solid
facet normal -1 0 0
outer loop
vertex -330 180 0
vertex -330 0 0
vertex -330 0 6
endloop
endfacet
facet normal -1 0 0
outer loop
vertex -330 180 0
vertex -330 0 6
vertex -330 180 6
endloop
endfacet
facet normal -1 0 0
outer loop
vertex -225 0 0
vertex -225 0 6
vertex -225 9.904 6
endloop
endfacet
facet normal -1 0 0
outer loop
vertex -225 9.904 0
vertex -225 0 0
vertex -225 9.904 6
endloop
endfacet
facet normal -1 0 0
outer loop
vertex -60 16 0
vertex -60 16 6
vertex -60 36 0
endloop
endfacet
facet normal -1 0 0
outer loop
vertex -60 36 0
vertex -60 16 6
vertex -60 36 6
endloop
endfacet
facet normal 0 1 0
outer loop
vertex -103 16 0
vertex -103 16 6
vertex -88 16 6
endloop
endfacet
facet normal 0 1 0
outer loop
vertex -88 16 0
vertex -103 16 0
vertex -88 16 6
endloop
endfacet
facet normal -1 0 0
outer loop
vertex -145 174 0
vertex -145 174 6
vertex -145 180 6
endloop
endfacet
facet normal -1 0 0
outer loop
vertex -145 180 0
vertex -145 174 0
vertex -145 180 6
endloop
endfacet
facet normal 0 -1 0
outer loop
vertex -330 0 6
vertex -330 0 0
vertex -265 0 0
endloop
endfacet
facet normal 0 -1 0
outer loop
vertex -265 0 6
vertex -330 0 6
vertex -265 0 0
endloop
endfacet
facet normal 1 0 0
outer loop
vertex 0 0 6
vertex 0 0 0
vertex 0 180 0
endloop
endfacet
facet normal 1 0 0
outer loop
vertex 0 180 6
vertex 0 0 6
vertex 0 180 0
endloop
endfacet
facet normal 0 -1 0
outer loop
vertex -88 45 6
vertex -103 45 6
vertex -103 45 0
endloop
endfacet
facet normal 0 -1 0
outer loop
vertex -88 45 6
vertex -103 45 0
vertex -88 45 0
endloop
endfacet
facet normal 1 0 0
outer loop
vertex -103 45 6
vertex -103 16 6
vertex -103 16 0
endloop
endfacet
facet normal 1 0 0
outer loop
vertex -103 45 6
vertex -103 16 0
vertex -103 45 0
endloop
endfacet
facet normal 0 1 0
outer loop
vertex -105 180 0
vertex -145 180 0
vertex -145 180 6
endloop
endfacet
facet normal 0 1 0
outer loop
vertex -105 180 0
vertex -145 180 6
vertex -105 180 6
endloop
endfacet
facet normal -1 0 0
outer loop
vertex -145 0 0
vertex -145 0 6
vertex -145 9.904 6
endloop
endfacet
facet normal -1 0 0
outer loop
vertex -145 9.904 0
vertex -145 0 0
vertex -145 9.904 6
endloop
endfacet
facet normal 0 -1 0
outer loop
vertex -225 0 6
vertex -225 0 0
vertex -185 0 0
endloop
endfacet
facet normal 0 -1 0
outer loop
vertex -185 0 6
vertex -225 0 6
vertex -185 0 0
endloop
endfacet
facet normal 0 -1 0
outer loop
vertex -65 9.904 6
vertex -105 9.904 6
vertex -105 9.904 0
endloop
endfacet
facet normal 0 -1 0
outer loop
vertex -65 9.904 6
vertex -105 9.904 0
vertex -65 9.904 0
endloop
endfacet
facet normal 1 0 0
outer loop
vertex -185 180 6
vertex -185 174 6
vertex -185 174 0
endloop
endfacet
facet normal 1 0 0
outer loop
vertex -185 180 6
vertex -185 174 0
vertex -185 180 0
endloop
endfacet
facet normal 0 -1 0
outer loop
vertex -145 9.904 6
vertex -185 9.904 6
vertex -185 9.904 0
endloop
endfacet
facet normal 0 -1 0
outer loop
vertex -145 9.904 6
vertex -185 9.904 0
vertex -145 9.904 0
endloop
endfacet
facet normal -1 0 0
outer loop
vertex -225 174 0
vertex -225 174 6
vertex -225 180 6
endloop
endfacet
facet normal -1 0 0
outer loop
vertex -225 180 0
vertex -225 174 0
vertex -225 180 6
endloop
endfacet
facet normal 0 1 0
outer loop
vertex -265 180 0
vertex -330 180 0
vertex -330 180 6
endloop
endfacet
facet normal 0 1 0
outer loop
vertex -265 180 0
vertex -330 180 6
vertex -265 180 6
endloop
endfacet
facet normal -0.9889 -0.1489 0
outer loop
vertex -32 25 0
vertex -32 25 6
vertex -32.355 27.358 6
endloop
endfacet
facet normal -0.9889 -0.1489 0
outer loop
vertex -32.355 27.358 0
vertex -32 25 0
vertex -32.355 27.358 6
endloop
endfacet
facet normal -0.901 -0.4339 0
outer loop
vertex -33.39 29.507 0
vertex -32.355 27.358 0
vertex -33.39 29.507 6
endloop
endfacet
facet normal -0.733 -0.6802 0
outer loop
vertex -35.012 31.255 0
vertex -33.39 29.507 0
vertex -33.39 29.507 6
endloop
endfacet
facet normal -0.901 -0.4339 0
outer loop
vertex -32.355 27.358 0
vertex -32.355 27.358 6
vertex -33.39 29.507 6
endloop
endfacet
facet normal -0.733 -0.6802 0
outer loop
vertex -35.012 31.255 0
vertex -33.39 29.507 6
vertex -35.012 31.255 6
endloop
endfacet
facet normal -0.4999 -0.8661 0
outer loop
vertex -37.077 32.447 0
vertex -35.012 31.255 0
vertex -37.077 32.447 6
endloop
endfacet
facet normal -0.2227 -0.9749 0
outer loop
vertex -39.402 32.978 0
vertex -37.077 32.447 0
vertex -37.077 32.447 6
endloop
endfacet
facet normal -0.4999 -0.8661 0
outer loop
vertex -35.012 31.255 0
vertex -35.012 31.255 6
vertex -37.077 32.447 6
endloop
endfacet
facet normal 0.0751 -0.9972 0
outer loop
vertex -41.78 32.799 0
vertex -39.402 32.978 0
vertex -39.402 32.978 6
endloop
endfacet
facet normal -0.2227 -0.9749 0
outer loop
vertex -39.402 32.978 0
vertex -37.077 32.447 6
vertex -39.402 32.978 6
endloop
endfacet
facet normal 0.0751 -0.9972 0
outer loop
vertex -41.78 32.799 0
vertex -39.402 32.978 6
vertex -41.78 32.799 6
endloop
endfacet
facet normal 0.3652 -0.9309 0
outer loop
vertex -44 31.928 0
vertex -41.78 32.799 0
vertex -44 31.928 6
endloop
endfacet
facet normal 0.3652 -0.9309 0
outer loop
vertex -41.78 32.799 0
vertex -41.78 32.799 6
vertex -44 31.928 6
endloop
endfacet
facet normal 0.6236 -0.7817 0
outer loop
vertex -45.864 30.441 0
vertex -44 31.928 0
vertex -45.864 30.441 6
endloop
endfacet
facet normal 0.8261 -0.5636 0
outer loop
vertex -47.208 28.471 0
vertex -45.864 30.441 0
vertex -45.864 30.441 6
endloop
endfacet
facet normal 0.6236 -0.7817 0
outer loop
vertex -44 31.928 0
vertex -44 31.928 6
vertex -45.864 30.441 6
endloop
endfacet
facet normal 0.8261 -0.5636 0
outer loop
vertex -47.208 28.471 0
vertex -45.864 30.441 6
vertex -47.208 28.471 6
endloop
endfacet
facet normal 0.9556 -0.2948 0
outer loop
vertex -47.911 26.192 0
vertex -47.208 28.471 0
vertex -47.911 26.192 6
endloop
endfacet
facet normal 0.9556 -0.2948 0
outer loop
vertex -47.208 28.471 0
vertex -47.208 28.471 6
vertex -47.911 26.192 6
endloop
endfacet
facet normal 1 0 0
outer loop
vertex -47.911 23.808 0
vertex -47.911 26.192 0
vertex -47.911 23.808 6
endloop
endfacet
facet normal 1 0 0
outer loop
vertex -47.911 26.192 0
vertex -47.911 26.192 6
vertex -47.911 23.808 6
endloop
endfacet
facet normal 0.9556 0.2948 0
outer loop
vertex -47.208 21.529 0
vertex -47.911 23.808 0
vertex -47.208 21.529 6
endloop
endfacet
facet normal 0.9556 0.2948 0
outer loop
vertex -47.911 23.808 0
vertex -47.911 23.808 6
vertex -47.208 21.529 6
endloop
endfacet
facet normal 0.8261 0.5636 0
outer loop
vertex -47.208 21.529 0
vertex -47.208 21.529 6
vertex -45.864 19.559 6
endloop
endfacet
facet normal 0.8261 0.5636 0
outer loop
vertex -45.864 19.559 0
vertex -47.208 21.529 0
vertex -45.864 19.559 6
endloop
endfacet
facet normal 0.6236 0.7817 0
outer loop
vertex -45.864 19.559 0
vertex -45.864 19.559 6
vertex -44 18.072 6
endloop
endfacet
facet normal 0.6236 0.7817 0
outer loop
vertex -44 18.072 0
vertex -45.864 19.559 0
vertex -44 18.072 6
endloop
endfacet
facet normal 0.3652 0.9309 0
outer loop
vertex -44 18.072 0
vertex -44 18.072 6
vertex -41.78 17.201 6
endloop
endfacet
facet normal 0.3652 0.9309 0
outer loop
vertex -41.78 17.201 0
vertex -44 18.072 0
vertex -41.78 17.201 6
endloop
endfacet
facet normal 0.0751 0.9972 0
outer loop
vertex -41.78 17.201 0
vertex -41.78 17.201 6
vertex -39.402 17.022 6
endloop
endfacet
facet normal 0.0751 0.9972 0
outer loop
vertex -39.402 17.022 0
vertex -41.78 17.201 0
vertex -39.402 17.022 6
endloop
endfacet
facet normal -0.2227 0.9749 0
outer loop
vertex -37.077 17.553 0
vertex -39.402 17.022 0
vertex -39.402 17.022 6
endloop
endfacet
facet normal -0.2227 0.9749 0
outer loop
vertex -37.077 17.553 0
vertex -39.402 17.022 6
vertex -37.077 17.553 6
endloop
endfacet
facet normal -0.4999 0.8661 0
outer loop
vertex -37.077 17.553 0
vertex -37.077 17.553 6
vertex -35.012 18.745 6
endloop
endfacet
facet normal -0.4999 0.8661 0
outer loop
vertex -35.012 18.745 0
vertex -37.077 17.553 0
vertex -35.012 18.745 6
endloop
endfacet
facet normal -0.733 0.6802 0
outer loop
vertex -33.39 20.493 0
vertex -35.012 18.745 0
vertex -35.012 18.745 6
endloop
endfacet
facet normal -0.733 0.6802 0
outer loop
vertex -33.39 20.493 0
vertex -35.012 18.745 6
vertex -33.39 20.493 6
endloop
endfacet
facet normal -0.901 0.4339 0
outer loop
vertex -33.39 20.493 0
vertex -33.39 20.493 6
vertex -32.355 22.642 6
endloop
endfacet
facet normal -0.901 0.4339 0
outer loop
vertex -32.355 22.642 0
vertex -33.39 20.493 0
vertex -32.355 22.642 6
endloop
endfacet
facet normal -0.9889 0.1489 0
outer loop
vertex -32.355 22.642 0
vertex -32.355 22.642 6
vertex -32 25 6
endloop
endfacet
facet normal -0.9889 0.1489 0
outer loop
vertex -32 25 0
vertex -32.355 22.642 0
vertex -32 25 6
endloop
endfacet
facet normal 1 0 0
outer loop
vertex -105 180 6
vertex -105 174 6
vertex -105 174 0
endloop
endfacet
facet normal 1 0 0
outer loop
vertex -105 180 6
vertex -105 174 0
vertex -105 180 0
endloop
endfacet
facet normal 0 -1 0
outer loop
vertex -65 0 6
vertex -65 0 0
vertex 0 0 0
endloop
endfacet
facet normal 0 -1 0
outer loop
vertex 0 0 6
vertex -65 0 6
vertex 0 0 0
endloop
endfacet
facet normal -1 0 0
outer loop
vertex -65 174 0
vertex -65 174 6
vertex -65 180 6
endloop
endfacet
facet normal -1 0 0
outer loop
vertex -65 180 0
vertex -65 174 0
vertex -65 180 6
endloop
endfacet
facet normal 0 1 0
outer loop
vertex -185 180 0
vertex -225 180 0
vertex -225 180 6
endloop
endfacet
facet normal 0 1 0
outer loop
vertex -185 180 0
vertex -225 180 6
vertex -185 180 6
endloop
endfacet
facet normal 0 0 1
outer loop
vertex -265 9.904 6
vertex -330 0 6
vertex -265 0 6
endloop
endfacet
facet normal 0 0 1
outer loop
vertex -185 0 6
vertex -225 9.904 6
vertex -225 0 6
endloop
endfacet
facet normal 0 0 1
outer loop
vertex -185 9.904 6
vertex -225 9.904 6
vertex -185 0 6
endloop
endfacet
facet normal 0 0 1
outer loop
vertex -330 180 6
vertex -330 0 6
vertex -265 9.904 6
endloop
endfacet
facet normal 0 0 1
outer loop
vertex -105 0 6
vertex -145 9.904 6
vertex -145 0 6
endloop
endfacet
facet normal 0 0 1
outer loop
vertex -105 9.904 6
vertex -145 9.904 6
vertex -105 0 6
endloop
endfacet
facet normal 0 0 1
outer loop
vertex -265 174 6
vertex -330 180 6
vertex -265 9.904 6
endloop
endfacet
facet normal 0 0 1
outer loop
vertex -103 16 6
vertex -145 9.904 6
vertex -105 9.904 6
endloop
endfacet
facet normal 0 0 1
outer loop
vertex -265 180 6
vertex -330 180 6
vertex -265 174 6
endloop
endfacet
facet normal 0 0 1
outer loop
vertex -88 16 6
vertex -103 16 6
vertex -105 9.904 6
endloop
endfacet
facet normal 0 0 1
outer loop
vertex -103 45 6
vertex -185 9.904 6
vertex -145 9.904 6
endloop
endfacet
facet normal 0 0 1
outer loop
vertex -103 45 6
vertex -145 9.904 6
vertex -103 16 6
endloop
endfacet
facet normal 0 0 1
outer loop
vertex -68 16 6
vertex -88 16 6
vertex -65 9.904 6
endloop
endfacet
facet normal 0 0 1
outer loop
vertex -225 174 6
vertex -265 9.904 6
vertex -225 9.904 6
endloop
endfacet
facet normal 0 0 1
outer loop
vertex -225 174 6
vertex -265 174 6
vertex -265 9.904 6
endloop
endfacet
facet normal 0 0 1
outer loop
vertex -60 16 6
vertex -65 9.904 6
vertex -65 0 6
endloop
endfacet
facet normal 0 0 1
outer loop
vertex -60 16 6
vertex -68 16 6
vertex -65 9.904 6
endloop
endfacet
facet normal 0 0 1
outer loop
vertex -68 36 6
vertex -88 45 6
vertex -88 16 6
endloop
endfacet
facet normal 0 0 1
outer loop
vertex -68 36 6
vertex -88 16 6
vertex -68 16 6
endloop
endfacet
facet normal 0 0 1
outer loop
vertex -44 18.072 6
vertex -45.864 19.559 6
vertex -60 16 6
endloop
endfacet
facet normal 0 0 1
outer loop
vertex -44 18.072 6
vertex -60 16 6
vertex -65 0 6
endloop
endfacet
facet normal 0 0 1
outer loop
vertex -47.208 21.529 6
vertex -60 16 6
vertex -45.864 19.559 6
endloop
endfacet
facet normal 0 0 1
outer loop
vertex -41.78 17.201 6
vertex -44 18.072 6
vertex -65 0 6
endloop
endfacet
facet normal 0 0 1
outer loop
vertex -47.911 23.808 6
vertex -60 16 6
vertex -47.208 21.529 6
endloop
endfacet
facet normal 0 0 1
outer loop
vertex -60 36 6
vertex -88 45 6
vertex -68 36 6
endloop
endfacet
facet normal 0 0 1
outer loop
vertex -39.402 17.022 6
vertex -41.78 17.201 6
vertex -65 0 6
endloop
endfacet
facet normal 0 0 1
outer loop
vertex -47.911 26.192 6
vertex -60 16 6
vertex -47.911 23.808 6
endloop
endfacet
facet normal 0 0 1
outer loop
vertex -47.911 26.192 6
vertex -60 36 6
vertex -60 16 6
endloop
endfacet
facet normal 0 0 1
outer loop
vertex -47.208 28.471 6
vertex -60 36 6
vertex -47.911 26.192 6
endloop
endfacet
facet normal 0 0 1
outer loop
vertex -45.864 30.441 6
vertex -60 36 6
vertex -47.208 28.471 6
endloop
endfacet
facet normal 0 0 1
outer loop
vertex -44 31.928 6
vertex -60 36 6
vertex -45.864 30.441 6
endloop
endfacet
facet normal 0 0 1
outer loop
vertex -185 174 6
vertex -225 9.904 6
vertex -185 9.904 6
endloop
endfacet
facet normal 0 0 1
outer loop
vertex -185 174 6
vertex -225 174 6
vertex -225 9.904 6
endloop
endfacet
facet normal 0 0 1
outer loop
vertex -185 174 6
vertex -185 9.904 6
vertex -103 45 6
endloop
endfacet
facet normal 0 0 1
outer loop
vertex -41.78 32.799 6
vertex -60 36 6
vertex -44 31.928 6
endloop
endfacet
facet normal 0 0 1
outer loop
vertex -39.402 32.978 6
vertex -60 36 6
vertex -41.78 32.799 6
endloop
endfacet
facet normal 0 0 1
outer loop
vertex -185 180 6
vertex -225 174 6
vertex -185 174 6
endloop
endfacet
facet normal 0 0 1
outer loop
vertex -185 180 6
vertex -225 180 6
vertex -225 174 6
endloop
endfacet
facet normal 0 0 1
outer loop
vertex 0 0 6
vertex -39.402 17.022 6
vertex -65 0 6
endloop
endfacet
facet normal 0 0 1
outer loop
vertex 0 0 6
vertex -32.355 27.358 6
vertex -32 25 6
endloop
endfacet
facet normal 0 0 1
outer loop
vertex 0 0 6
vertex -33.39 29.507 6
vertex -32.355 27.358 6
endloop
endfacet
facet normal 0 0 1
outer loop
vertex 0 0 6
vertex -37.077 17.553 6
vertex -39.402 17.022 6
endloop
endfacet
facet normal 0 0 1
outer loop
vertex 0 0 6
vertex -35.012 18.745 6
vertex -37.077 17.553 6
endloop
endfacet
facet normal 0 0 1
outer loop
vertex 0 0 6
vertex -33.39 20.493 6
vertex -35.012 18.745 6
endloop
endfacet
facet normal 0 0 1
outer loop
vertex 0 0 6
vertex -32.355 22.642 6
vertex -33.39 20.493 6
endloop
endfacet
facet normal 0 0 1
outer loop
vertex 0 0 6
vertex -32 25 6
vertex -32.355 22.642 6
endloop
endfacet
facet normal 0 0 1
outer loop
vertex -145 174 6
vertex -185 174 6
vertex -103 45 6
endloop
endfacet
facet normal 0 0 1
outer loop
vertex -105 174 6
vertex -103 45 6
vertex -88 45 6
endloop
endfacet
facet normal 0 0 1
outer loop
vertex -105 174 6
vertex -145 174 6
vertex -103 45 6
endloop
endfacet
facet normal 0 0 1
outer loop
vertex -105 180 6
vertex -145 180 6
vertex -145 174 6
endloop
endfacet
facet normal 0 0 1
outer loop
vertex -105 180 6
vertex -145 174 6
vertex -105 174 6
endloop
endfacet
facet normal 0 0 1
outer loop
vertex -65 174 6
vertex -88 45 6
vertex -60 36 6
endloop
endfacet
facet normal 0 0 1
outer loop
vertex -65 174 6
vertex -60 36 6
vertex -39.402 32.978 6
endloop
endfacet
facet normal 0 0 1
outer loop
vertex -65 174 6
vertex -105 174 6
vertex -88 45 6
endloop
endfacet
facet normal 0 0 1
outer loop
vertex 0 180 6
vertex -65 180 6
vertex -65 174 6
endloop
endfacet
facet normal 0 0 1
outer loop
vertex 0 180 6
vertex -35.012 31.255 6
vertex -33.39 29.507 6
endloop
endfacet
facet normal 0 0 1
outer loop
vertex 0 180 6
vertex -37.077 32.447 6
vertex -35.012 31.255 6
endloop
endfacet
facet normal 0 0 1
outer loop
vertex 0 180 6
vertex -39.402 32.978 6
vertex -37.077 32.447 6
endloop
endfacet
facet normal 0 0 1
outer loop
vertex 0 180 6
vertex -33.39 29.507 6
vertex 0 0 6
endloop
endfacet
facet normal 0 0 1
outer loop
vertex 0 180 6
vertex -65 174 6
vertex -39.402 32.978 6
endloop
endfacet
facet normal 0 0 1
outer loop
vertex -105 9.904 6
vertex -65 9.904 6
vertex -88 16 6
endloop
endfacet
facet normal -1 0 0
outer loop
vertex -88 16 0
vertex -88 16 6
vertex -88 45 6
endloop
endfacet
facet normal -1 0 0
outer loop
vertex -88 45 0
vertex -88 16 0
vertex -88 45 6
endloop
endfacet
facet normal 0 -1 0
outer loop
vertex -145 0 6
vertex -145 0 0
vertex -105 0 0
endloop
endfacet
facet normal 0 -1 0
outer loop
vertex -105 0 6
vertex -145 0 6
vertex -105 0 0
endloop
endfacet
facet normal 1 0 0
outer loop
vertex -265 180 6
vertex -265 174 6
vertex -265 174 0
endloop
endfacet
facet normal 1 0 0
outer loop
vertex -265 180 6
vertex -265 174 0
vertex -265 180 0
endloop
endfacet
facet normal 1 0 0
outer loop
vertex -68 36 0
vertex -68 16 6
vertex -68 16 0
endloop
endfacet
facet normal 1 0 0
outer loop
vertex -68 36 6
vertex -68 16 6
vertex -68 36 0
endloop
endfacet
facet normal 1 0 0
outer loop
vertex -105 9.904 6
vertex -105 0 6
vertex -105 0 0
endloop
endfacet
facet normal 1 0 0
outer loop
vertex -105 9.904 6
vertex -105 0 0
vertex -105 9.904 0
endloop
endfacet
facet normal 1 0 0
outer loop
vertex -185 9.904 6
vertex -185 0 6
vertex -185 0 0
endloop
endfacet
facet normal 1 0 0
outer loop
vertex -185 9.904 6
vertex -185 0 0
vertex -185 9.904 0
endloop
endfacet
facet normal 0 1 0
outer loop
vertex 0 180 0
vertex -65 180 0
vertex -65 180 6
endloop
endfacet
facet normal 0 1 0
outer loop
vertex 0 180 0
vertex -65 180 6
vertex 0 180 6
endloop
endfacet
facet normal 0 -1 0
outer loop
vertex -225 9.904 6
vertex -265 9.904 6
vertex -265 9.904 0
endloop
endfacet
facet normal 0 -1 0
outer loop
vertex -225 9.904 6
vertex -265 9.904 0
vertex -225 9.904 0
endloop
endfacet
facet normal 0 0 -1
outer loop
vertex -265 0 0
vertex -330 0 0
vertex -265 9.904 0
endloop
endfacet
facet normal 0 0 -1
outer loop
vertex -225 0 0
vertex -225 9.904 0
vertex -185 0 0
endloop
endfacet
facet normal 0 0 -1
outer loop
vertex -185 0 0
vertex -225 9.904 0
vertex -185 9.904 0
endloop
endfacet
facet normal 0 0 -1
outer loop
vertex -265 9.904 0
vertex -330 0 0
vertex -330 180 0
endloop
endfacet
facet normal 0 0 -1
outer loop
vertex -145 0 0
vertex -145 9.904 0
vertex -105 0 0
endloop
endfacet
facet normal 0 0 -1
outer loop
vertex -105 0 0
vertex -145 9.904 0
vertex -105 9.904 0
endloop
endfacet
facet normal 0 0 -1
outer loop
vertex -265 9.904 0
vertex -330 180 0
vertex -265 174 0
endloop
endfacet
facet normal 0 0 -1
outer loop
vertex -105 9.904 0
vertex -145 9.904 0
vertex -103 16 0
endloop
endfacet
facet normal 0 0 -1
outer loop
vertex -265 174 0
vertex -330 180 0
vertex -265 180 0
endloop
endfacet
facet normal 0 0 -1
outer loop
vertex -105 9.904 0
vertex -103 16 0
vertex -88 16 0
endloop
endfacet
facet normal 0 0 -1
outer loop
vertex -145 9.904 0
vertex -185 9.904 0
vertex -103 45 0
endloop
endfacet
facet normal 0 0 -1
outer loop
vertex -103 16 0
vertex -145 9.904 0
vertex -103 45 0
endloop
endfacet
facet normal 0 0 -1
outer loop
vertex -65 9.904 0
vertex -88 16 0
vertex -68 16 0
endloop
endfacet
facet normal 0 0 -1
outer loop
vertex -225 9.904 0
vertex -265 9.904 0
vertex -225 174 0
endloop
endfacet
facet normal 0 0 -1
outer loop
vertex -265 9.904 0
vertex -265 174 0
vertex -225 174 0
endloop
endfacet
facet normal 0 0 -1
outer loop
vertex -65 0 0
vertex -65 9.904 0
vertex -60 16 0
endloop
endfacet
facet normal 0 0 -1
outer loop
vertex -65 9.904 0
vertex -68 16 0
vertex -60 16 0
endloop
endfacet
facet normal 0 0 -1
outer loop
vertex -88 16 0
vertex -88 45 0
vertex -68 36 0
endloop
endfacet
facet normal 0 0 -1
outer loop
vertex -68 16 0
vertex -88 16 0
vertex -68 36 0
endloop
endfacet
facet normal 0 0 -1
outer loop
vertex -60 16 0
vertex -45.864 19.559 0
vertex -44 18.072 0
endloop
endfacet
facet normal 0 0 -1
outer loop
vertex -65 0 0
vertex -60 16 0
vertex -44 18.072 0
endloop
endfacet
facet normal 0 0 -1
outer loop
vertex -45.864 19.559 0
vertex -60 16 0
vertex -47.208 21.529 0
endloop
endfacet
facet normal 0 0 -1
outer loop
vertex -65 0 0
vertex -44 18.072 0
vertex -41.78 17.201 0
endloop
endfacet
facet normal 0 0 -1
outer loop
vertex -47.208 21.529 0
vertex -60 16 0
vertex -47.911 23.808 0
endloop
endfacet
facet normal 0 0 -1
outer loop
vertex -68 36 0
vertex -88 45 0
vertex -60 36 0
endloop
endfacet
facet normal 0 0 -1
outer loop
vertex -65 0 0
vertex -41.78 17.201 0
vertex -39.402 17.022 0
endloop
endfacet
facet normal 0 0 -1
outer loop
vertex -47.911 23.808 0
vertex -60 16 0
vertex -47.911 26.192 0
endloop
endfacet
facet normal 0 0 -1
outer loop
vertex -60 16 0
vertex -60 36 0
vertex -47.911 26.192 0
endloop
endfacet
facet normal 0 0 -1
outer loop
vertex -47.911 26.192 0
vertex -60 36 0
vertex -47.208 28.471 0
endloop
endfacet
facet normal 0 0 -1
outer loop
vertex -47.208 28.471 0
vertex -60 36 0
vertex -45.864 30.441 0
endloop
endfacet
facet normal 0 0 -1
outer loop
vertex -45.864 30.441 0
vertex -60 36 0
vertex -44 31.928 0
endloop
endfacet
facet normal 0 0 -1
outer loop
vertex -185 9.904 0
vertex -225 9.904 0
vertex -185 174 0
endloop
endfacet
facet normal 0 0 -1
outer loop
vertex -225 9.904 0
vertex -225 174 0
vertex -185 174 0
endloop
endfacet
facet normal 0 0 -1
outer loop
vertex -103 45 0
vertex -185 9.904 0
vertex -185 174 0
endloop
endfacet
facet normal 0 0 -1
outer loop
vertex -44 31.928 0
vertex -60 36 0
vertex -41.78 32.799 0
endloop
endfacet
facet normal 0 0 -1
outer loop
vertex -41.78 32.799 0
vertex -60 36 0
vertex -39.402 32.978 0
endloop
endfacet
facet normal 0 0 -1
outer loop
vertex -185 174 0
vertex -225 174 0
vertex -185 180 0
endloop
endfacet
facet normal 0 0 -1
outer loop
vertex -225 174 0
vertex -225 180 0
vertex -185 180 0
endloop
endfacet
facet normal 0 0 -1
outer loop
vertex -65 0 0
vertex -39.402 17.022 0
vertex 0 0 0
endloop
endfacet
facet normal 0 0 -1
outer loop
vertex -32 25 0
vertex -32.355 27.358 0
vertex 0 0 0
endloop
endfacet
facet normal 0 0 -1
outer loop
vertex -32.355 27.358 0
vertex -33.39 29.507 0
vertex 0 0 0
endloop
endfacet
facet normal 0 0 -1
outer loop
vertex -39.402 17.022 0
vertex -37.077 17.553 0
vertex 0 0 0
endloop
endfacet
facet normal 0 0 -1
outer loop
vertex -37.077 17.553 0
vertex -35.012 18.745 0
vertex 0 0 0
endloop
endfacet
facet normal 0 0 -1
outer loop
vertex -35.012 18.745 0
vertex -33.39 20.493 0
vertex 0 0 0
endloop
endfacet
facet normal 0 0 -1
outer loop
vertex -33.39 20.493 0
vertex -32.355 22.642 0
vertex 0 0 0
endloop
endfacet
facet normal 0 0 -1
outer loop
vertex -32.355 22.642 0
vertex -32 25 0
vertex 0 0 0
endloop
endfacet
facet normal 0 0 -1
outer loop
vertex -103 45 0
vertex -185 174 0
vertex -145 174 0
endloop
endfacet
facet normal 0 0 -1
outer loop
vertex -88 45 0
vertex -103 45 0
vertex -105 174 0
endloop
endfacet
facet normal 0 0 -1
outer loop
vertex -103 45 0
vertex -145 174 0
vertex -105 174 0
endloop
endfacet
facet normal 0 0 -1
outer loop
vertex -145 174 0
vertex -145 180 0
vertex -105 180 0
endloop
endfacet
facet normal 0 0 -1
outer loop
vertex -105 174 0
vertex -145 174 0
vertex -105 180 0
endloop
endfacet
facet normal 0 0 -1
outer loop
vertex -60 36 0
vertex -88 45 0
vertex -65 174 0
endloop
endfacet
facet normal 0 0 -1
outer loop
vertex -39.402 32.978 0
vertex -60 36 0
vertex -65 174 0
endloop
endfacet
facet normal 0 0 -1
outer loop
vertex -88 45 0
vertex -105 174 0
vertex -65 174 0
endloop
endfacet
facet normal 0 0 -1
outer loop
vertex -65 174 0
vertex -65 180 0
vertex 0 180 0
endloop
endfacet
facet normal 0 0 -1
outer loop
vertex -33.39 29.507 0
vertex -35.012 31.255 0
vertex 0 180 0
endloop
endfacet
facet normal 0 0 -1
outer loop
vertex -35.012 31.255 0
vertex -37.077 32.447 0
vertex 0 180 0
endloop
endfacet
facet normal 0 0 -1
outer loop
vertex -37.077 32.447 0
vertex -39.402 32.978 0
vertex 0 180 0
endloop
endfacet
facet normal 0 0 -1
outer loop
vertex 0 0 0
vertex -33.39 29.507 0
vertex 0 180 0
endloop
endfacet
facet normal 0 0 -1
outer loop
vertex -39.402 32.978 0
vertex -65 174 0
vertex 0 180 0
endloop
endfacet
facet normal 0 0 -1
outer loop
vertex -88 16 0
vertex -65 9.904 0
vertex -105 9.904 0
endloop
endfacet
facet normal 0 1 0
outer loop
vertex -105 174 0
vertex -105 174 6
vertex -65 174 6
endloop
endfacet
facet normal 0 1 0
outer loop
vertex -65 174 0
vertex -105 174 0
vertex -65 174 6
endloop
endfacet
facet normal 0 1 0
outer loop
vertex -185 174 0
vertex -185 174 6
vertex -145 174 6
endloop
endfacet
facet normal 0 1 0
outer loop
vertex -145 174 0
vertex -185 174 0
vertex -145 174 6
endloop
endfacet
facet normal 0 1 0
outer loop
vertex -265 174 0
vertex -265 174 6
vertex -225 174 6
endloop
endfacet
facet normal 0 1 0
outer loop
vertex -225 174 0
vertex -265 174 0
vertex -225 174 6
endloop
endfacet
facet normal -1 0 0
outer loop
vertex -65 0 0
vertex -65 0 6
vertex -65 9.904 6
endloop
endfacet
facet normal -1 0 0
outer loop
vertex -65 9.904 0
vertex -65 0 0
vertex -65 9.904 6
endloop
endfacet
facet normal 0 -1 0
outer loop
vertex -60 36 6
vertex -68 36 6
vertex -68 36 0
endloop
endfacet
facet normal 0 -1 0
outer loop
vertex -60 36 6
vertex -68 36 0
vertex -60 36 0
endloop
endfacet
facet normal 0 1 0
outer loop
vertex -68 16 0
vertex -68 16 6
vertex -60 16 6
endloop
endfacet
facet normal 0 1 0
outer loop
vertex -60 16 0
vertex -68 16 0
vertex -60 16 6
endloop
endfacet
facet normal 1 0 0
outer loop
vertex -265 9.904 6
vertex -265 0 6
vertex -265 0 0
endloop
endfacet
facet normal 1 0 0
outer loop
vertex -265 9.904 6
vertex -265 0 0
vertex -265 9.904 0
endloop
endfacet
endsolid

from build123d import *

# Parameters (mm, degrees)
ESQUISSE1_W             = 330
ESQUISSE1_H             = 180
BOSS_EXTRU_1_DEPTH      = 6
ESQUISSE2_W             = 40
ESQUISSE2_H             = 6
ESQUISSE2_H_2           = 9.903585907
ENL_V_MAT_ENCOCHE_DEPTH = 6
ESQUISSE3_R             = 8
ESQUISSE3_W             = 15
ESQUISSE3_H             = 29
ESQUISSE3_W_2           = 8
ESQUISSE3_H_2           = 20
ENL_V_MAT_EXTRU_1_DEPTH = 10


with BuildPart() as part:
    # Esquisse1 → Boss.-Extru.1 (new body)
    with BuildSketch(Plane.XY):
        with Locations((-165, 90)):
            Rectangle(ESQUISSE1_W, ESQUISSE1_H)
    extrude(amount=BOSS_EXTRU_1_DEPTH)

    # Esquisse2 → Enlèv. mat encoche (cut)
    with BuildSketch(Plane.XY.offset(6)):
        with Locations((-245, 177)):
            Rectangle(ESQUISSE2_W, ESQUISSE2_H)
        with Locations((-165, 177)):
            Rectangle(ESQUISSE2_W, ESQUISSE2_H)
        with Locations((-85, 177)):
            Rectangle(ESQUISSE2_W, ESQUISSE2_H)
        with Locations((-245, 4.951792954)):
            Rectangle(ESQUISSE2_W, ESQUISSE2_H_2)
        with Locations((-165, 4.951792954)):
            Rectangle(ESQUISSE2_W, ESQUISSE2_H_2)
        with Locations((-85, 4.951792954)):
            Rectangle(ESQUISSE2_W, ESQUISSE2_H_2)
    extrude(amount=-ENL_V_MAT_ENCOCHE_DEPTH, mode=Mode.SUBTRACT)

    # Esquisse3 → Enlèv. mat.-Extru.1 (cut)
    with BuildSketch(Plane.XY.offset(6)):
        with Locations((-40, 25)):
            Circle(ESQUISSE3_R)
        with Locations((-95.5, 30.5)):
            Rectangle(ESQUISSE3_W, ESQUISSE3_H)
        with Locations((-64, 26)):
            Rectangle(ESQUISSE3_W_2, ESQUISSE3_H_2)
    extrude(amount=-ENL_V_MAT_EXTRU_1_DEPTH, mode=Mode.SUBTRACT)


solid = part.part
